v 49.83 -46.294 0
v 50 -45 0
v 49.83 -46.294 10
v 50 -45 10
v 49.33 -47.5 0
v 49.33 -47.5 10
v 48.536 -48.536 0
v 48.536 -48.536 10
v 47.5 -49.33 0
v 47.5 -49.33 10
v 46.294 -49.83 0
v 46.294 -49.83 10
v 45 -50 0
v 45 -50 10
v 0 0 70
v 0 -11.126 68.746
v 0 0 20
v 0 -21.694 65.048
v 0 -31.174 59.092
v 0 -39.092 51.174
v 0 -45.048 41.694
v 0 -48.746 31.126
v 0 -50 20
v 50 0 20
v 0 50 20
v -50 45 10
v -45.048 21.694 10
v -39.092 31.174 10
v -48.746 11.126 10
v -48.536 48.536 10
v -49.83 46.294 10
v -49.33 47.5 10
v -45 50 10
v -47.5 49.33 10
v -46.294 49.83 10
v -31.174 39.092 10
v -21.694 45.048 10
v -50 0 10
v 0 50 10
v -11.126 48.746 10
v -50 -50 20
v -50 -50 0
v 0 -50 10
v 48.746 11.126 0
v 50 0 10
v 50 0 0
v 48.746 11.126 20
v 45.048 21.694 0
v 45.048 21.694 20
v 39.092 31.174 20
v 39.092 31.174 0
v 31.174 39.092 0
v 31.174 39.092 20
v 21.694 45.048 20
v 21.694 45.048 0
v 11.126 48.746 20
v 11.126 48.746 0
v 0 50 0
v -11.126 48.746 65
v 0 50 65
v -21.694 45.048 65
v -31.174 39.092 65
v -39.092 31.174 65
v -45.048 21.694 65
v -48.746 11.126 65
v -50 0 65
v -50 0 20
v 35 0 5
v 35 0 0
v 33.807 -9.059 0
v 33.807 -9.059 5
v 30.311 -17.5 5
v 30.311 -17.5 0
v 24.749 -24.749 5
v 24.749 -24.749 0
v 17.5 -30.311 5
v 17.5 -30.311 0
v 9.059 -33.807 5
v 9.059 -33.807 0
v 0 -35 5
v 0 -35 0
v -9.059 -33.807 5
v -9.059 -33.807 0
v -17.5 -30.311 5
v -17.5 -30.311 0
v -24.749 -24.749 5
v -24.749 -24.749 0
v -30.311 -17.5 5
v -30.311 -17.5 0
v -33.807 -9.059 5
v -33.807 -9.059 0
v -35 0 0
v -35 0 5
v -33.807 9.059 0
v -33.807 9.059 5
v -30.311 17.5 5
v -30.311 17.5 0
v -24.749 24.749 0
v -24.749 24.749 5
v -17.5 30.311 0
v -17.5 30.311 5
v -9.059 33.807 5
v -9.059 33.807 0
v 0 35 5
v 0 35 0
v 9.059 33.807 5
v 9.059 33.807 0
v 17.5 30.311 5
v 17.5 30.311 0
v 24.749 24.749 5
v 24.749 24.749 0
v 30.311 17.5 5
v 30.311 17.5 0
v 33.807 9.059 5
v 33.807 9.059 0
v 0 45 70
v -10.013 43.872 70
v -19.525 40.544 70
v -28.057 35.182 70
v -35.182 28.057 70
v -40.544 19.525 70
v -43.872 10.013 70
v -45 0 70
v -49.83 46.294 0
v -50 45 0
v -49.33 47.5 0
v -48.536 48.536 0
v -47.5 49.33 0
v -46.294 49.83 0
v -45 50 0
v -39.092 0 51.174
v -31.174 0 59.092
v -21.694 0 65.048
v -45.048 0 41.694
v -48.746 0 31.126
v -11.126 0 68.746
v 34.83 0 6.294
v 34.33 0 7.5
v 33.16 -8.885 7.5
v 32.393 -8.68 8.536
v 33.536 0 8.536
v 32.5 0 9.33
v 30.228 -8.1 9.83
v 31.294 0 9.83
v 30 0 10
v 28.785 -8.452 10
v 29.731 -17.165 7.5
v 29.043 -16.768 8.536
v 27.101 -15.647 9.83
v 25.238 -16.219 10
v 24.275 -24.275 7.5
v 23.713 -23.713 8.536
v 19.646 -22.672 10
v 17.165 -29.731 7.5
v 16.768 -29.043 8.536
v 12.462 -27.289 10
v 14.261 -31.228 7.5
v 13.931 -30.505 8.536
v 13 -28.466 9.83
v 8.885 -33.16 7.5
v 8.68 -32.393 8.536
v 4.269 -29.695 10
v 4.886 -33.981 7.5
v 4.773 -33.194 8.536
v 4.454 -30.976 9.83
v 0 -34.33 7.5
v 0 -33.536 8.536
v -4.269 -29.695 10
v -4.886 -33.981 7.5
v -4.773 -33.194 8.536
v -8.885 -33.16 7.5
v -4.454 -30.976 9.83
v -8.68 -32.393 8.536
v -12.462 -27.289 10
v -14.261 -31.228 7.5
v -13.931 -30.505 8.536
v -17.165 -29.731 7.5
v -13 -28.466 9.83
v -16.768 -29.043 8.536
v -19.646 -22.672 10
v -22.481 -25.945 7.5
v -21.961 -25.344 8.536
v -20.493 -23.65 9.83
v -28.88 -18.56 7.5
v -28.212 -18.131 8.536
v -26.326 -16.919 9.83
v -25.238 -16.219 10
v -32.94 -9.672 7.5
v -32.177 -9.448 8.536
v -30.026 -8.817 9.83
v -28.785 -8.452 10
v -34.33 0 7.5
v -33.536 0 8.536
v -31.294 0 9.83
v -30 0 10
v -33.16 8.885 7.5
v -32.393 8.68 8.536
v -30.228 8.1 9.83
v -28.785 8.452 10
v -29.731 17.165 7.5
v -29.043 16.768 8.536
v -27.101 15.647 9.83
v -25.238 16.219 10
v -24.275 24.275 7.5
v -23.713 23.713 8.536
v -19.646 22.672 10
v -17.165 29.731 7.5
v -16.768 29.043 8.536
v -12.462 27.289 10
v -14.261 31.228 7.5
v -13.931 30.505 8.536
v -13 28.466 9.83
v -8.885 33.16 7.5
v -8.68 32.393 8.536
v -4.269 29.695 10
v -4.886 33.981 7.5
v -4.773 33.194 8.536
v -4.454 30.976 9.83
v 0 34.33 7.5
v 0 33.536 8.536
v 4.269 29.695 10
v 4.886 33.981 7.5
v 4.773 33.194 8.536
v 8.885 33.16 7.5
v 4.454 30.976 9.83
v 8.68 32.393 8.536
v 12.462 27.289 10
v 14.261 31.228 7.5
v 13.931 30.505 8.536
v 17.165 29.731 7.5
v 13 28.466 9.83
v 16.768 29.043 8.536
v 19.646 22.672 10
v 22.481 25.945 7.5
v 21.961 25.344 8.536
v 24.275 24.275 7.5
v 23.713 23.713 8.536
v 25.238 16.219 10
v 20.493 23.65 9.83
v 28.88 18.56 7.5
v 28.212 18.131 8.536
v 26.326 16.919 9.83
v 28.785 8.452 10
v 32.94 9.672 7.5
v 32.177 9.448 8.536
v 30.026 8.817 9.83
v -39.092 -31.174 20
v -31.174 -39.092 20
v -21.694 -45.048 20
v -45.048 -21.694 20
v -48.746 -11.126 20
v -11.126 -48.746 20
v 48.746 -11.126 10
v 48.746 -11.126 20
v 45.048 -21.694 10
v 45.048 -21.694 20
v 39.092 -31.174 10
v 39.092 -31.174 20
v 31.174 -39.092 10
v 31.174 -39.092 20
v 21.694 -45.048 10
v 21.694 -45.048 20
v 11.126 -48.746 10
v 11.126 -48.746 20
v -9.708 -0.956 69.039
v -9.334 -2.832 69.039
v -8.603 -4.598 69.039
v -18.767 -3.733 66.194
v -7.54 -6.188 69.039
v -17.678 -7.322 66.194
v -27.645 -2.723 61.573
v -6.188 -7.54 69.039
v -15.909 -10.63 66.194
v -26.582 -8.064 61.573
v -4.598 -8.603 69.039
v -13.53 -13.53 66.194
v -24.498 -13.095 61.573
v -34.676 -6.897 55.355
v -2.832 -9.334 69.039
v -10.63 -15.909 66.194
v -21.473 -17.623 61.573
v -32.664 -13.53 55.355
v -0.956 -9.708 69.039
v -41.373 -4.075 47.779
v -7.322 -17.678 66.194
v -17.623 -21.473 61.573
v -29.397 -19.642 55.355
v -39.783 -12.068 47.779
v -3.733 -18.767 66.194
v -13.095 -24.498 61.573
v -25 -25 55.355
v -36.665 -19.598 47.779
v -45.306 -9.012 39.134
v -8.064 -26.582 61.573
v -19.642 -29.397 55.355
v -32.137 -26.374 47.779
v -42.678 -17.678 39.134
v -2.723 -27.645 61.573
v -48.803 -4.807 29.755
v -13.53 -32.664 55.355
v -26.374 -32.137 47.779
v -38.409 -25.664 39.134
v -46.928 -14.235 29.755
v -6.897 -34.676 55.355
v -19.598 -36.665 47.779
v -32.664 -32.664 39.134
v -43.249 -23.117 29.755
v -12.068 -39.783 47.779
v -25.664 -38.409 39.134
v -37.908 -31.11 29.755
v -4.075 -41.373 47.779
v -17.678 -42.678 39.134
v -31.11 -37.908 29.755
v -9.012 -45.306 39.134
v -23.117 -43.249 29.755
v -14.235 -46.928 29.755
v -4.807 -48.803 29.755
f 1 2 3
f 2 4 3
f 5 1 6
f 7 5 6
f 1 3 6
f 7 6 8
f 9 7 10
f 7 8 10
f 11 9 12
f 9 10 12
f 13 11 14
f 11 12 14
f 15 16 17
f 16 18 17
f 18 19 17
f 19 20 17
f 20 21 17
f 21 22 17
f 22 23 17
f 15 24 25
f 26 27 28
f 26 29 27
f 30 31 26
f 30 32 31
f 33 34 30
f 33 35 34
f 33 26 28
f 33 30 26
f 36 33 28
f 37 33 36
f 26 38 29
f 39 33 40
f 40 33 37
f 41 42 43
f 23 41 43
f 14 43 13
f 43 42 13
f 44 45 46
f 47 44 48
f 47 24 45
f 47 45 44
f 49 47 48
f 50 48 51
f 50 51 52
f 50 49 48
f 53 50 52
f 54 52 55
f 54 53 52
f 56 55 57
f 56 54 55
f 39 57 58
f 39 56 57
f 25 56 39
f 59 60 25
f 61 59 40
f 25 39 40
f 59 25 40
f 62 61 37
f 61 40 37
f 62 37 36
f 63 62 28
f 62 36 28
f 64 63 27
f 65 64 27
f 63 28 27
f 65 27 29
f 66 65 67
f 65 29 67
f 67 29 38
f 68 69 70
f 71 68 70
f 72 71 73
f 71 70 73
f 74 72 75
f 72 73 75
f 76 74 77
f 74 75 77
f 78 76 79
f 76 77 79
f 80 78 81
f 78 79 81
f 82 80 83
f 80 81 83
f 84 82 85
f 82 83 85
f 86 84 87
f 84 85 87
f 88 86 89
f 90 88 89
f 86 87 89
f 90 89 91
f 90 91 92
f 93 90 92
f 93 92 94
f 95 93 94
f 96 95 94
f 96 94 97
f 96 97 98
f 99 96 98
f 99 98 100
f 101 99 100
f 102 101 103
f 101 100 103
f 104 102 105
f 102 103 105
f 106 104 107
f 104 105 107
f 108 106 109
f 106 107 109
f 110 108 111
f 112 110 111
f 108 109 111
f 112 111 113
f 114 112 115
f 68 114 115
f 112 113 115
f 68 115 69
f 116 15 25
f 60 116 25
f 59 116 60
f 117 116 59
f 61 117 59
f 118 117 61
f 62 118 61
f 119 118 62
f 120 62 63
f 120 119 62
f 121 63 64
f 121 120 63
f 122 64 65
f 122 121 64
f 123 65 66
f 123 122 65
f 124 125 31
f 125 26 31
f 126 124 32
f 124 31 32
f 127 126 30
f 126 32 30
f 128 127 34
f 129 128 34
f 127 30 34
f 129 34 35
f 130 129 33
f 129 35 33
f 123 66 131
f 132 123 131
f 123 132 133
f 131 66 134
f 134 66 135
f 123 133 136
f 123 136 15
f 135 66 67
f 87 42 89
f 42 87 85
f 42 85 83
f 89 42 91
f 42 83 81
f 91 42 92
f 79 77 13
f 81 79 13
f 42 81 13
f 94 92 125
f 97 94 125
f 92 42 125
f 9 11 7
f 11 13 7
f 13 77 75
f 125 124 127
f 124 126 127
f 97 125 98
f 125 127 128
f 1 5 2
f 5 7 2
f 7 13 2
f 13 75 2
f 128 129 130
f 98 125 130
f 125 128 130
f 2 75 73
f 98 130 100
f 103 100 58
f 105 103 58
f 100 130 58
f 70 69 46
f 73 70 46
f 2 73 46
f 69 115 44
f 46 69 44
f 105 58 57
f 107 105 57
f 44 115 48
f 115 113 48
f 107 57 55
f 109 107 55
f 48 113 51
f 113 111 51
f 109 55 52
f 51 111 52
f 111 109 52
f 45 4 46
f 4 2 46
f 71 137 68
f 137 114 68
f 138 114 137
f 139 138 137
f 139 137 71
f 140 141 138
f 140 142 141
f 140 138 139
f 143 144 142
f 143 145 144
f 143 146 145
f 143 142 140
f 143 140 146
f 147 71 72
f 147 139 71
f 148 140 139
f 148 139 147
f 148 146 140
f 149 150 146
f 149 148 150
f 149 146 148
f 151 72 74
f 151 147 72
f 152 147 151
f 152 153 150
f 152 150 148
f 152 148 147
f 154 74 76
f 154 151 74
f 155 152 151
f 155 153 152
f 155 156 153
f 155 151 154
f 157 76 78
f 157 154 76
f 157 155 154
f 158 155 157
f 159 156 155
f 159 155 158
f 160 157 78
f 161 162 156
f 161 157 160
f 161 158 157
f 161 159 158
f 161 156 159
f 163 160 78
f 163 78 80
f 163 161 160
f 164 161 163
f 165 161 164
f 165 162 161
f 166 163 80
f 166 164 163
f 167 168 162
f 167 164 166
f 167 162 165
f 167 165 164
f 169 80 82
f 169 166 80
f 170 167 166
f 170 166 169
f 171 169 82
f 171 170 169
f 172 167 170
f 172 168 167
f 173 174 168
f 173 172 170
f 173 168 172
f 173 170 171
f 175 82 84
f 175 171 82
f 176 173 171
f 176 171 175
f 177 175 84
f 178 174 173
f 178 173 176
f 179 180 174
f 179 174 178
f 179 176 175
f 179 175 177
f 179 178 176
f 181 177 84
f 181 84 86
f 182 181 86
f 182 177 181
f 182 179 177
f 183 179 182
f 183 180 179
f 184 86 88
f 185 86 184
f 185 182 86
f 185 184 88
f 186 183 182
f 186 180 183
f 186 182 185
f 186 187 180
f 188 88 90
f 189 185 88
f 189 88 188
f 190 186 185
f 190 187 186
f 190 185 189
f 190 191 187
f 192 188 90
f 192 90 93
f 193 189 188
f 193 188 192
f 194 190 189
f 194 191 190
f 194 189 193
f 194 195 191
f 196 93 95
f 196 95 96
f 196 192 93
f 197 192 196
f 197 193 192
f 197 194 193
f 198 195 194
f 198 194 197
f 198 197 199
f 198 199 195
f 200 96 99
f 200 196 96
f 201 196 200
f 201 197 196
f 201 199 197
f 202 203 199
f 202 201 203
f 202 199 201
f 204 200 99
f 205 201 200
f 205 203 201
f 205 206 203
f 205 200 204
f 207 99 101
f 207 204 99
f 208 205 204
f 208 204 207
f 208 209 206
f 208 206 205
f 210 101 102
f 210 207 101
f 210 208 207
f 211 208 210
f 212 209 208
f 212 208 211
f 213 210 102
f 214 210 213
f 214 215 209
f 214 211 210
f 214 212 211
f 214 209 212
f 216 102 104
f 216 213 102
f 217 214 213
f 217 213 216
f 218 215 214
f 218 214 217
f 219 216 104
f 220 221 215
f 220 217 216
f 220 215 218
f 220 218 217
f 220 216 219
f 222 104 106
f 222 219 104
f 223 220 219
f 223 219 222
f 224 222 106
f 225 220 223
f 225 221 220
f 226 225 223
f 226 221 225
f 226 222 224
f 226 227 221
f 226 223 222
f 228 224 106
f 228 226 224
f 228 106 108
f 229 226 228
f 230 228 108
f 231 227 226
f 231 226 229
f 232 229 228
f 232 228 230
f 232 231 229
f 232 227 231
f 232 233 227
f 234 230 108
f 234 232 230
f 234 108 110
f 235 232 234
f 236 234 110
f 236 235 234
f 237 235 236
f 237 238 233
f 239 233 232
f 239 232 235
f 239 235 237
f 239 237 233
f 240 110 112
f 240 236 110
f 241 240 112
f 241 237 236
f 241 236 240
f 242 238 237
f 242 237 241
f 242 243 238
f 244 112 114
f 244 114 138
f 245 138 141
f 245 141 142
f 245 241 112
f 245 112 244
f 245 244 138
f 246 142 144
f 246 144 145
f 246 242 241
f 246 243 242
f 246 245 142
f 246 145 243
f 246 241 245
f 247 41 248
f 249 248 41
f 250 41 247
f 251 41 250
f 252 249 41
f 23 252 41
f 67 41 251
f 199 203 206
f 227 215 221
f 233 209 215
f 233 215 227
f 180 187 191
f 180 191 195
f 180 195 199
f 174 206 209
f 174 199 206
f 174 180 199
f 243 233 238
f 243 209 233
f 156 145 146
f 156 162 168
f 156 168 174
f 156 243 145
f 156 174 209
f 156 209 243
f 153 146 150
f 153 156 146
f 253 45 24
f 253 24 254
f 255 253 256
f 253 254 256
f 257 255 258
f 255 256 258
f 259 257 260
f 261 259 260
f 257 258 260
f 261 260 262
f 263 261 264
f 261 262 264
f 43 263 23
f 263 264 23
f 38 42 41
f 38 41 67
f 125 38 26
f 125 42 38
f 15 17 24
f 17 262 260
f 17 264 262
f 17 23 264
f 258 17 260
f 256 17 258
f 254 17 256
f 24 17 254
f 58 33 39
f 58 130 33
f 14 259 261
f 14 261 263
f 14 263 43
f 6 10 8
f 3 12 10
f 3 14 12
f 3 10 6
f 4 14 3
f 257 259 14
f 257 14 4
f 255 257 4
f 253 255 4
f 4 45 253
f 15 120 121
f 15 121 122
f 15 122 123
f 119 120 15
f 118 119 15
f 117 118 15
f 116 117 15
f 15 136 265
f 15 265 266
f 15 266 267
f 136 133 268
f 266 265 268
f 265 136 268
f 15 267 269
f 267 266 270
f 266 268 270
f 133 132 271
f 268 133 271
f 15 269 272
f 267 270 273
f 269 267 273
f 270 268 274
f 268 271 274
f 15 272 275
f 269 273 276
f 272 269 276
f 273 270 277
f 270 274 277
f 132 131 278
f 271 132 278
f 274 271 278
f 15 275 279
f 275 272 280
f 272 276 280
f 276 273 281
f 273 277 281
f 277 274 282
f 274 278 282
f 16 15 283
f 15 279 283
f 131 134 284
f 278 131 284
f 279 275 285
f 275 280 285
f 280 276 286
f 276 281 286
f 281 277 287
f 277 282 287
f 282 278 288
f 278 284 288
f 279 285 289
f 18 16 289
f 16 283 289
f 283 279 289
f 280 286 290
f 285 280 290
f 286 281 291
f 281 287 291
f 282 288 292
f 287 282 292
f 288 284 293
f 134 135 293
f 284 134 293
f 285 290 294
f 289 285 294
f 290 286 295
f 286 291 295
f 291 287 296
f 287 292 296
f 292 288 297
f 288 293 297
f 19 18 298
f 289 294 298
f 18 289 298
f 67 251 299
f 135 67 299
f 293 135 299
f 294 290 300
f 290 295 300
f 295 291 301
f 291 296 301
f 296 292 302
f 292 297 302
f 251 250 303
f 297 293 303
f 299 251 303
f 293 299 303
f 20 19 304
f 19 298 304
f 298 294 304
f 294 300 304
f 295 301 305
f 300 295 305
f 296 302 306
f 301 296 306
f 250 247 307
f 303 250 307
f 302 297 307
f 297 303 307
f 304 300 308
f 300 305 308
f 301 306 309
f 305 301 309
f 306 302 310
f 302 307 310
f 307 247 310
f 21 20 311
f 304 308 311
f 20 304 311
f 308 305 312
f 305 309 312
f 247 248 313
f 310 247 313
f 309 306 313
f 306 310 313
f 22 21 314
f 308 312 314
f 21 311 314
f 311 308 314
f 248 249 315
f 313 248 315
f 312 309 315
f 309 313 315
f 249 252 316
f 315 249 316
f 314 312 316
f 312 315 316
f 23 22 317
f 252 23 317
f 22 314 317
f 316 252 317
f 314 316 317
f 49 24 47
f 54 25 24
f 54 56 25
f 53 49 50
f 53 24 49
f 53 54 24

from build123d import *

# Parameters (mm, degrees)
F0_W      = 100
F0_H      = 100
F1_DEPTH  = 20
F2_R      = 50
F4_DEPTH  = 10
F6_ANGLE  = 90
F7_W      = 50
F7_H      = 50
F8_DEPTH  = 10
F10_DEPTH = 60
F11_SIZE  = 5
F12_R     = 5
F16_R     = 35
F17_DEPTH = 10
F18_R     = 5


with BuildPart() as f1:
    # F0 (on Top) → F1 (new body)
    with BuildSketch(Plane.XY):
        Rectangle(F0_W, F0_H)
    extrude(amount=F1_DEPTH)

    # F2
    f2_edges = [f1.edges().sort_by_distance(p)[0] for p in [
        (50, 50, 10),
    ]]
    fillet(f2_edges, radius=F2_R)

    # F3 (on face) → F4 (cut)
    with BuildSketch(Plane.XY.offset(20)):
        with BuildLine():
            ThreePointArc((50, 0), (35.3553390593, -35.3553390593), (0, -50))
            Line((0, -50), (50, -50))
            Line((50, -50), (50, 0))
        make_face()
    extrude(amount=-F4_DEPTH, mode=Mode.SUBTRACT)

    # F5 (on Front) → F6 (revolve)
    with BuildSketch(Plane.XZ):
        with BuildLine():
            ThreePointArc((0, 70), (-35.3553390593, 55.3553390593), (-50, 20))
            Line((-50, 20), (0, 20))
            Line((0, 20), (0, 70))
        make_face()
    revolve(axis=Axis((0, 0, 45), (0, 0, 1)), revolution_arc=F6_ANGLE)

    # F7 (on face) → F8 (cut)
    with BuildSketch(Plane.XY.offset(20)):
        with Locations((-25, 25)):
            Rectangle(F7_W, F7_H)
    extrude(amount=-F8_DEPTH, mode=Mode.SUBTRACT)

    # F9 (on face) → F10 (join)
    with BuildSketch(Plane.XY.offset(10)):
        with BuildLine():
            ThreePointArc((0, 50), (-35.3553390593, 35.3553390593), (-50, 0))
            Line((-50, 0), (0, 0))
            Line((0, 0), (0, 50))
        make_face()
    extrude(amount=F10_DEPTH)

    # F11
    f11_edges = [f1.edges().sort_by_distance(p)[0] for p in [
        (-35.355339, 35.355339, 70),
    ]]
    chamfer(f11_edges, length=F11_SIZE)

    # F12
    f12_edges = [f1.edges().sort_by_distance(p)[0] for p in [
        (-50, 50, 5),
        (50, -50, 5),
    ]]
    fillet(f12_edges, radius=F12_R)

    # F13 (on face) → F15 section 0
    with BuildSketch(Plane.XY.offset(20), mode=Mode.PRIVATE) as f15_s0:
        Polygon((50, 0), (0, 50), (0, 0), align=None)
    loft([f15_s0.sketch, Vertex(0, 0, 70)])

    # F16 (on face) → F17 (cut)
    with BuildSketch(Plane(origin=(0, 0, 0), x_dir=(1, 0, 0), z_dir=(0, 0, -1))):
        Circle(F16_R)
    extrude(amount=-F17_DEPTH, mode=Mode.SUBTRACT)

    # F18
    f18_edges = [f1.edges().sort_by_distance(p)[0] for p in [
        (-35, 0, 10),
    ]]
    fillet(f18_edges, radius=F18_R)


solid = f1.part
